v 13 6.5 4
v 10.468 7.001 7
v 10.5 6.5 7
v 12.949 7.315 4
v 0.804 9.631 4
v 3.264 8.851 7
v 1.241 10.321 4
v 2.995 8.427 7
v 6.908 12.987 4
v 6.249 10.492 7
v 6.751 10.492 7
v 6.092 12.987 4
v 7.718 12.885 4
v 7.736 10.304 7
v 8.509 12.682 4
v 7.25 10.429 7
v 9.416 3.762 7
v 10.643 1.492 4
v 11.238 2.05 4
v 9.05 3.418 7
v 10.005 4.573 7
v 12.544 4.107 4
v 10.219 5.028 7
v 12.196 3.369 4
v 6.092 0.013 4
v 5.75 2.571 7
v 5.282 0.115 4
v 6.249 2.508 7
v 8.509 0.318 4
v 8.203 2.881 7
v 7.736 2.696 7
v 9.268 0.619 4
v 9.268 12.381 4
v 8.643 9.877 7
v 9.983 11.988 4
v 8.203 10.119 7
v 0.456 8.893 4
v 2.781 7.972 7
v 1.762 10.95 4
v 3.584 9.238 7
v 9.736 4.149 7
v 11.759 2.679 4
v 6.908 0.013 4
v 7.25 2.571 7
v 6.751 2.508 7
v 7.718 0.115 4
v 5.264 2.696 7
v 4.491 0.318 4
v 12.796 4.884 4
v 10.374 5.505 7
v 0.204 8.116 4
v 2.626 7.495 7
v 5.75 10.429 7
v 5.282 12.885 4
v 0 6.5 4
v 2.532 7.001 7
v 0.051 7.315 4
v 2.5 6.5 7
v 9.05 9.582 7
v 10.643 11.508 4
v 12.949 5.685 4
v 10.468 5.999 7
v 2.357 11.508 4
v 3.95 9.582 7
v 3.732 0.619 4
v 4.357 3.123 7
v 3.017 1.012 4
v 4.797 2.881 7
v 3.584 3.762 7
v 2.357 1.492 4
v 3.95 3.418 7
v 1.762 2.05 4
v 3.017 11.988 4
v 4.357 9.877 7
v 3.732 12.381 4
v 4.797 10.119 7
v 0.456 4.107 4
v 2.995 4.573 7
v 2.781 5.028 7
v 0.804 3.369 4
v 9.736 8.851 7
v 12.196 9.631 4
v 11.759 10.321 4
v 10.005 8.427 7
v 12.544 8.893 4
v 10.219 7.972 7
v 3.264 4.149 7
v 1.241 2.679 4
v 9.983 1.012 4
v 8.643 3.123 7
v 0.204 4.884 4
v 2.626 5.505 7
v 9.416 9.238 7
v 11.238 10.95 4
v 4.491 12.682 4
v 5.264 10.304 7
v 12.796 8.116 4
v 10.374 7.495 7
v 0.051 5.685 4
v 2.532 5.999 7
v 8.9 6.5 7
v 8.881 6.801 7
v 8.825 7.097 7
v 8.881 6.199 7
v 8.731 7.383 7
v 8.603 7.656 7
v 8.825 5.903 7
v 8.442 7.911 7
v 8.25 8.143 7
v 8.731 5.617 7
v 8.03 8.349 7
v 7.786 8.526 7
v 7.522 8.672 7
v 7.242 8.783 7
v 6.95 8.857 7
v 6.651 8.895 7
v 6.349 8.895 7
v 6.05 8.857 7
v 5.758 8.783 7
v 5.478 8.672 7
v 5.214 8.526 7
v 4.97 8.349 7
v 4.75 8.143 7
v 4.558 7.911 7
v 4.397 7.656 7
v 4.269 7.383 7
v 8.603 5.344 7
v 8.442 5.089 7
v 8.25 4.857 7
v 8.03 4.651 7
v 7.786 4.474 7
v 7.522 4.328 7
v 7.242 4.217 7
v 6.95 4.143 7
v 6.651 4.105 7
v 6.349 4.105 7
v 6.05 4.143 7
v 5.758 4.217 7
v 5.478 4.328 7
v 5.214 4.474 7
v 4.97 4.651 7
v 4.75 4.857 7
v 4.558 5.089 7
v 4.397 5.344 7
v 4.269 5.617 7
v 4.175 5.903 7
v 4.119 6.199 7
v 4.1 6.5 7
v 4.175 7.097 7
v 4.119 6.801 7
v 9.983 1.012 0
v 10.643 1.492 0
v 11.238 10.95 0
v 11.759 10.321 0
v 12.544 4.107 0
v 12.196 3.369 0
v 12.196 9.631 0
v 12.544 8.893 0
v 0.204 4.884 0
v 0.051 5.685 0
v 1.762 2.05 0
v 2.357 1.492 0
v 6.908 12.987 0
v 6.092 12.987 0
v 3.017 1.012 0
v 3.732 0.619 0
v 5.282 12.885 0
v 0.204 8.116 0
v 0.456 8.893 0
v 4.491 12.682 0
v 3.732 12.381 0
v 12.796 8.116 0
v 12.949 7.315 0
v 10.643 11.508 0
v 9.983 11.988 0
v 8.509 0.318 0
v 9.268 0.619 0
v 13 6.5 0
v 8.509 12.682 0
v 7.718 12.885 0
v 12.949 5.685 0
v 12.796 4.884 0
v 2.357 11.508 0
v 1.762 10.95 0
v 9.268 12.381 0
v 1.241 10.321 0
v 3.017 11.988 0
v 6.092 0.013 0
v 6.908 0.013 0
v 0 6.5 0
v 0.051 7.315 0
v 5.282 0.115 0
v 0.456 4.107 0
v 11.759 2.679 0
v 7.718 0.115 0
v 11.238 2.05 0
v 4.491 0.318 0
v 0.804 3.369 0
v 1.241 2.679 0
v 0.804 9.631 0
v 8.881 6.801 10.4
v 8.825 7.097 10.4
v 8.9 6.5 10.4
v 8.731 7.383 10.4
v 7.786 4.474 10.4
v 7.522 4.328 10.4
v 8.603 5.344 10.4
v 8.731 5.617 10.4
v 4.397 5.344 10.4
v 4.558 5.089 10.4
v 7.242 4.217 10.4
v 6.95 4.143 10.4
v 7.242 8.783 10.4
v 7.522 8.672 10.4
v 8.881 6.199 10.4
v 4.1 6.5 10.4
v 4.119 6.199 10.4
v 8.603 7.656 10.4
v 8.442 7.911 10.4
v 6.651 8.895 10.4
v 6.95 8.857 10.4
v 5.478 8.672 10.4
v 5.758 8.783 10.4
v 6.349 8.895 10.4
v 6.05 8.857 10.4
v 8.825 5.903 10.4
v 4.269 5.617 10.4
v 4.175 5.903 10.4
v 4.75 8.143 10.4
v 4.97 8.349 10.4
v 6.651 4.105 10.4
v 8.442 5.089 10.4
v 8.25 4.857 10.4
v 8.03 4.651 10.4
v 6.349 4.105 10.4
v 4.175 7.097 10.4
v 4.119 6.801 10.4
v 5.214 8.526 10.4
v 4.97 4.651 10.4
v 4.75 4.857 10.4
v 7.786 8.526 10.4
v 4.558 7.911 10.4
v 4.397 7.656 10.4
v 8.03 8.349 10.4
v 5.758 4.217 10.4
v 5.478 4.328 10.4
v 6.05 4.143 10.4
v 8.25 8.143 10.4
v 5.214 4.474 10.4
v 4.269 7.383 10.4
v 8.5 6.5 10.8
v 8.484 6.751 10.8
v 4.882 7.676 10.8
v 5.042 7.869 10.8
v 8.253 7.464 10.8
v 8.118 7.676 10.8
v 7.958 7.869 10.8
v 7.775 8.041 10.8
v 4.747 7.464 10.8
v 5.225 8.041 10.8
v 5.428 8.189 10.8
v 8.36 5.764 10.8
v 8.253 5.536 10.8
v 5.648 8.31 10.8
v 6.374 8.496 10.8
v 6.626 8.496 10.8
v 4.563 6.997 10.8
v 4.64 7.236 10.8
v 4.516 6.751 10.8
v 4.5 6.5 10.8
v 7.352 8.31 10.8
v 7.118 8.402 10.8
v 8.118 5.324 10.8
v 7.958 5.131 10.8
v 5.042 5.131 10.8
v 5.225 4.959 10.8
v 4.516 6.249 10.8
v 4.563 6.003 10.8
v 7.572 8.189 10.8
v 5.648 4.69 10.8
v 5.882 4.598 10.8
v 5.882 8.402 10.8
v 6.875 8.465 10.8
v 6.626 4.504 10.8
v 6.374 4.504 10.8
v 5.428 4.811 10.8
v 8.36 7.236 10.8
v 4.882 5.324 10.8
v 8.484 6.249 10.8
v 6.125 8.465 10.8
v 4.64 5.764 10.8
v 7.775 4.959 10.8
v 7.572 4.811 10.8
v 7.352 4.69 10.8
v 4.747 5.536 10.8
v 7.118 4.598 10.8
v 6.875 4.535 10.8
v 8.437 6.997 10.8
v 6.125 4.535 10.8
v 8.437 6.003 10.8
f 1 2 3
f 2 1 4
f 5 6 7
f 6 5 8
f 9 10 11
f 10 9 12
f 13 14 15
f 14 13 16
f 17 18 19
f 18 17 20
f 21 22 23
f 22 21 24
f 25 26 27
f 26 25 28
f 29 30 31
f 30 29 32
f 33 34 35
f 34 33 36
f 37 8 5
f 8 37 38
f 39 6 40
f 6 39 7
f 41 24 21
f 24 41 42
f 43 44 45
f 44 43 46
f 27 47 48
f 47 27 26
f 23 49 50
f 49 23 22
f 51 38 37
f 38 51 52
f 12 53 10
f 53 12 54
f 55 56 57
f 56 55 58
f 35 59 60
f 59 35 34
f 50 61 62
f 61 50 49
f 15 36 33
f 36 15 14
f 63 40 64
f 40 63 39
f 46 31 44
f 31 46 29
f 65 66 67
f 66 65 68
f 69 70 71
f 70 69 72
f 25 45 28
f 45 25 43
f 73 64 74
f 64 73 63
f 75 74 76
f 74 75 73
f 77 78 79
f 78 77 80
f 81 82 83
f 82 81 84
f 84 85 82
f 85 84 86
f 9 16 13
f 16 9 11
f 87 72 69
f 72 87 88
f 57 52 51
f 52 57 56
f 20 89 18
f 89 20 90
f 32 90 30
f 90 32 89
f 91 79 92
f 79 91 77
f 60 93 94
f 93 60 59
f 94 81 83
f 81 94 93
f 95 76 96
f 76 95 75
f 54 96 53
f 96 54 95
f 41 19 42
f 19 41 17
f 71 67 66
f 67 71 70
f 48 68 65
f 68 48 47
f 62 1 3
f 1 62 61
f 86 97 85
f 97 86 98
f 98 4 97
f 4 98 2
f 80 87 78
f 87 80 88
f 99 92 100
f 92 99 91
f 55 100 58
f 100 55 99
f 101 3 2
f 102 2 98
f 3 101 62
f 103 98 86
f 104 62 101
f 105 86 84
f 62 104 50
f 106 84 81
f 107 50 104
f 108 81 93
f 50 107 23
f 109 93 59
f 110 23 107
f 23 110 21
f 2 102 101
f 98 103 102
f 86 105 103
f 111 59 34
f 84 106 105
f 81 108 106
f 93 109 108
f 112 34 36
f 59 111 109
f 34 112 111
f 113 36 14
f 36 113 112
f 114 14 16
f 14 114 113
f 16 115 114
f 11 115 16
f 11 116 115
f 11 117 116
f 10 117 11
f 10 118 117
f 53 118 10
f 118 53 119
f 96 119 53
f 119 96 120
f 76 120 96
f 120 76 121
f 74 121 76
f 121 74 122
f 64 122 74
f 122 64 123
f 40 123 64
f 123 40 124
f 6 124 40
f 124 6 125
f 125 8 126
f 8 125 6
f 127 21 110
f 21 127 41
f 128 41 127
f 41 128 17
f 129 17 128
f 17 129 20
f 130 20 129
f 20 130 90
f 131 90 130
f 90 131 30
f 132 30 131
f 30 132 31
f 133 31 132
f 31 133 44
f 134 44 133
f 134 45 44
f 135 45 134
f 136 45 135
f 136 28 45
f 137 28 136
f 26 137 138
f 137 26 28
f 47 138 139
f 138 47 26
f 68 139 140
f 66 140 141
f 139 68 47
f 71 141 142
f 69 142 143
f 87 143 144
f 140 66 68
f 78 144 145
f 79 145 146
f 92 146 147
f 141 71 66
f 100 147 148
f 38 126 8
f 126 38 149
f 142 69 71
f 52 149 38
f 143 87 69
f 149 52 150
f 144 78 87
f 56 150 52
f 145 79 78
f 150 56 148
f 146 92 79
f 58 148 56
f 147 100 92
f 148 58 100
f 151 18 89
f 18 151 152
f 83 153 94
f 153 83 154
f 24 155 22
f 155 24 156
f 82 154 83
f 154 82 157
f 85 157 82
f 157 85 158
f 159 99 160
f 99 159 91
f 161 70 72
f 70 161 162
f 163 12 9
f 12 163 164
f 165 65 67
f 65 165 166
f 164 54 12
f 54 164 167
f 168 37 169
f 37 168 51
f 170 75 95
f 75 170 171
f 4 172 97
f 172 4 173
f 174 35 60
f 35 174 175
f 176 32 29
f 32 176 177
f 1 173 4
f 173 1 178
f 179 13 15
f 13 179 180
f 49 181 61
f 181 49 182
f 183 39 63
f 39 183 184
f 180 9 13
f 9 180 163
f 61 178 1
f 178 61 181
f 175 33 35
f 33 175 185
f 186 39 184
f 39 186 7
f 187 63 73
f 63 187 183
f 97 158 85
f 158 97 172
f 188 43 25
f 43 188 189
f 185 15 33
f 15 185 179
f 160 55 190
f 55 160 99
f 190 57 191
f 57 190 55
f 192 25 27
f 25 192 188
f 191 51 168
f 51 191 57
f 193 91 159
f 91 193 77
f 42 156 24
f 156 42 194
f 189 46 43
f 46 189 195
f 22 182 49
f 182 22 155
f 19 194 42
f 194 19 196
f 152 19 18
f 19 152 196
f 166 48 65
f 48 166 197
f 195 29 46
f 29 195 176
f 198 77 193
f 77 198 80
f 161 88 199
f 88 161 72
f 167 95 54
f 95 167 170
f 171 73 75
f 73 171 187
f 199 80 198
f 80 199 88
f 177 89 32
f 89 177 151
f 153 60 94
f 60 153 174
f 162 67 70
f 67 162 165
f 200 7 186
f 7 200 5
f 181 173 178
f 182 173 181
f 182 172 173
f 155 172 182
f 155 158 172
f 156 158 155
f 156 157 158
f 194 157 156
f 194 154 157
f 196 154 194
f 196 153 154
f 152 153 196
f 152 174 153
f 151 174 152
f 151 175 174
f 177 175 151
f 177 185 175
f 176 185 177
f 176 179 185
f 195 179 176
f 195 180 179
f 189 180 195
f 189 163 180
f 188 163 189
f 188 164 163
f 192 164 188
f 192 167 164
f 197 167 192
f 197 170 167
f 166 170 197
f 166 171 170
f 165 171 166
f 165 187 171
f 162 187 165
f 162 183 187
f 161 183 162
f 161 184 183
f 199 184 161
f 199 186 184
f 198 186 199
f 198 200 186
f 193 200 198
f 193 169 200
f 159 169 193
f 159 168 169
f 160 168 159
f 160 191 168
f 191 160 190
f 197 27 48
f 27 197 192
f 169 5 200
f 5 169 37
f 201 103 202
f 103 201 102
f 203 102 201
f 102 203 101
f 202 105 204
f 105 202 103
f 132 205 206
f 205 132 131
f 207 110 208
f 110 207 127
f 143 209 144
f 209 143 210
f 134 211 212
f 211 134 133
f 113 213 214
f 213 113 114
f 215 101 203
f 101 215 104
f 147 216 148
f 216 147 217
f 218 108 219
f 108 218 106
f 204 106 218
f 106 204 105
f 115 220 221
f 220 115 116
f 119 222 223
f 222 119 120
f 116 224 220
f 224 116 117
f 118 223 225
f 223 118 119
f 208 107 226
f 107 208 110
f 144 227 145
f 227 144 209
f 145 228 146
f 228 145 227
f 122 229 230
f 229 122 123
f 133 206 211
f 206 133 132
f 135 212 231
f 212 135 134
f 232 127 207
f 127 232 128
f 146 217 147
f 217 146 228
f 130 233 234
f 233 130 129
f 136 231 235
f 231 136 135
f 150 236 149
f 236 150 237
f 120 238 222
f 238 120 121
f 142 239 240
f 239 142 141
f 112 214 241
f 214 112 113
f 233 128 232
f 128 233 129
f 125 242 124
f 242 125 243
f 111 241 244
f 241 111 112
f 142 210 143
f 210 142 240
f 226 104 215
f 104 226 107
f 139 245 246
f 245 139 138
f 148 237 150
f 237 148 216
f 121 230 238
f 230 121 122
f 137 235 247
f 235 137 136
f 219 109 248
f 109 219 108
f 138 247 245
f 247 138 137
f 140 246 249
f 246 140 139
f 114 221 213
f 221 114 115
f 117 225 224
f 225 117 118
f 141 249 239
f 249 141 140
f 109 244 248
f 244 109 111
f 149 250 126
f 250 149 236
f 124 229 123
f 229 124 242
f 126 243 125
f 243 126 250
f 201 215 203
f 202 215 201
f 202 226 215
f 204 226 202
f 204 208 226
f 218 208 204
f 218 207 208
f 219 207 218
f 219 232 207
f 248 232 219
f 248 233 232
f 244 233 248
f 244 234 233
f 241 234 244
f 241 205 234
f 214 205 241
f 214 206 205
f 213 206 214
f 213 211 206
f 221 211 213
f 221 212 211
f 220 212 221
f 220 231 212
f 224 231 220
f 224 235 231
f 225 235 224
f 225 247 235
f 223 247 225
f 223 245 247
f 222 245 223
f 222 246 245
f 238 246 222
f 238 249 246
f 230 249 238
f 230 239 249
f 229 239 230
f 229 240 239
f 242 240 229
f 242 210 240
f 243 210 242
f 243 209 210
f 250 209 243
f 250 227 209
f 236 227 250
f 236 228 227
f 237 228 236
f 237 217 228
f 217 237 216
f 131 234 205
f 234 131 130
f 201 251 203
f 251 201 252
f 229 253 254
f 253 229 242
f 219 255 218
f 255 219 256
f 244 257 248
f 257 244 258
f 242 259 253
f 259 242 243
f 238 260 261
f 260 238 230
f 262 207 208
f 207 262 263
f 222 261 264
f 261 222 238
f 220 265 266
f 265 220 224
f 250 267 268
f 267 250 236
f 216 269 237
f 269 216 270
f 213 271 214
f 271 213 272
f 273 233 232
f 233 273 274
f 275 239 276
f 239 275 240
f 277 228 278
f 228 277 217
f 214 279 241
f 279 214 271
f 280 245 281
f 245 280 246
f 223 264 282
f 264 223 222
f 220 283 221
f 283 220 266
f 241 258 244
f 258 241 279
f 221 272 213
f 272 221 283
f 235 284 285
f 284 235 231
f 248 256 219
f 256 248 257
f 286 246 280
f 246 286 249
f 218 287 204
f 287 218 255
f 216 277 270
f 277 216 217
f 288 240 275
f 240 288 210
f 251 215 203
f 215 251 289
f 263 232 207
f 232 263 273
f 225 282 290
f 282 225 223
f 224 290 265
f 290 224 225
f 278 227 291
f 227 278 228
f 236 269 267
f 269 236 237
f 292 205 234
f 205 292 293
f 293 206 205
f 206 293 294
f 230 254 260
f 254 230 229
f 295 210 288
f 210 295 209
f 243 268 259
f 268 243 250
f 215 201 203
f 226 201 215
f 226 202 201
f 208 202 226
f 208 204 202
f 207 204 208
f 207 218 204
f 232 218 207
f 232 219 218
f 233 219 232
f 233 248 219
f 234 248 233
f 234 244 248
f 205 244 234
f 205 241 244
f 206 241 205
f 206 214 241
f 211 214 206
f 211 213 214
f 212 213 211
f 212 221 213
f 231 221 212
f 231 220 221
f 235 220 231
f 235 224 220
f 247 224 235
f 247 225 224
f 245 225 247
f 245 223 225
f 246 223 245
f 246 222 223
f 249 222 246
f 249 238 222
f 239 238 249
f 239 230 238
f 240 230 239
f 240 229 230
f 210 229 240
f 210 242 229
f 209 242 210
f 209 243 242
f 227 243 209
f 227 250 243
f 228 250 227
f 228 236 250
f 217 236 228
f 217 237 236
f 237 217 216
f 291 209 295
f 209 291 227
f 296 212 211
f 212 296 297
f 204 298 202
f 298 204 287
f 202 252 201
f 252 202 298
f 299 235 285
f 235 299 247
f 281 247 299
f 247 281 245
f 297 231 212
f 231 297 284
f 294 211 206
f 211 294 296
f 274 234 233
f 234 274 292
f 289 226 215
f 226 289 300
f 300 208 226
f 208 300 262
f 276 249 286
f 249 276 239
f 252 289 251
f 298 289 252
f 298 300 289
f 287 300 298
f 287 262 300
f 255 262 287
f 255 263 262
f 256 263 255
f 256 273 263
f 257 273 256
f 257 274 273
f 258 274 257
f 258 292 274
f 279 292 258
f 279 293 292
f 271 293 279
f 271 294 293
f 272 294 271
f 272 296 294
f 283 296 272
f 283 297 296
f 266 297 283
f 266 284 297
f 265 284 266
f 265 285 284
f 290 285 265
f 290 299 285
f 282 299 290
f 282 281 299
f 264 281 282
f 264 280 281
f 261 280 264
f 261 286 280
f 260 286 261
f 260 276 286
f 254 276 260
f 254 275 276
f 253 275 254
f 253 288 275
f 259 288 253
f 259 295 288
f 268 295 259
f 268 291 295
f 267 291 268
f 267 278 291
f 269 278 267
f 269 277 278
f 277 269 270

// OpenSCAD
translate([6.5, 6.5, 0]) {
  union() {
    union() {
      union() {
        cylinder(h = 4, r = 6.5);
        translate([0, 0, 4]) {
          intersection() {
            cylinder(h = 7.8, r1 = 6.5, r2 = 0);
            cylinder(h = 3, r = 6.5);
          }
        }
      }
      translate([0, 0, 6.8]) {
        cylinder(h = 3.6, r = 2.4);
      }
    }
    translate([0, 0, 10.4]) {
      intersection() {
        cylinder(h = 2.4, r1 = 2.4, r2 = 0);
        cylinder(h = 0.4, r = 2.4);
      }
    }
  }
}
$fn = 50;
